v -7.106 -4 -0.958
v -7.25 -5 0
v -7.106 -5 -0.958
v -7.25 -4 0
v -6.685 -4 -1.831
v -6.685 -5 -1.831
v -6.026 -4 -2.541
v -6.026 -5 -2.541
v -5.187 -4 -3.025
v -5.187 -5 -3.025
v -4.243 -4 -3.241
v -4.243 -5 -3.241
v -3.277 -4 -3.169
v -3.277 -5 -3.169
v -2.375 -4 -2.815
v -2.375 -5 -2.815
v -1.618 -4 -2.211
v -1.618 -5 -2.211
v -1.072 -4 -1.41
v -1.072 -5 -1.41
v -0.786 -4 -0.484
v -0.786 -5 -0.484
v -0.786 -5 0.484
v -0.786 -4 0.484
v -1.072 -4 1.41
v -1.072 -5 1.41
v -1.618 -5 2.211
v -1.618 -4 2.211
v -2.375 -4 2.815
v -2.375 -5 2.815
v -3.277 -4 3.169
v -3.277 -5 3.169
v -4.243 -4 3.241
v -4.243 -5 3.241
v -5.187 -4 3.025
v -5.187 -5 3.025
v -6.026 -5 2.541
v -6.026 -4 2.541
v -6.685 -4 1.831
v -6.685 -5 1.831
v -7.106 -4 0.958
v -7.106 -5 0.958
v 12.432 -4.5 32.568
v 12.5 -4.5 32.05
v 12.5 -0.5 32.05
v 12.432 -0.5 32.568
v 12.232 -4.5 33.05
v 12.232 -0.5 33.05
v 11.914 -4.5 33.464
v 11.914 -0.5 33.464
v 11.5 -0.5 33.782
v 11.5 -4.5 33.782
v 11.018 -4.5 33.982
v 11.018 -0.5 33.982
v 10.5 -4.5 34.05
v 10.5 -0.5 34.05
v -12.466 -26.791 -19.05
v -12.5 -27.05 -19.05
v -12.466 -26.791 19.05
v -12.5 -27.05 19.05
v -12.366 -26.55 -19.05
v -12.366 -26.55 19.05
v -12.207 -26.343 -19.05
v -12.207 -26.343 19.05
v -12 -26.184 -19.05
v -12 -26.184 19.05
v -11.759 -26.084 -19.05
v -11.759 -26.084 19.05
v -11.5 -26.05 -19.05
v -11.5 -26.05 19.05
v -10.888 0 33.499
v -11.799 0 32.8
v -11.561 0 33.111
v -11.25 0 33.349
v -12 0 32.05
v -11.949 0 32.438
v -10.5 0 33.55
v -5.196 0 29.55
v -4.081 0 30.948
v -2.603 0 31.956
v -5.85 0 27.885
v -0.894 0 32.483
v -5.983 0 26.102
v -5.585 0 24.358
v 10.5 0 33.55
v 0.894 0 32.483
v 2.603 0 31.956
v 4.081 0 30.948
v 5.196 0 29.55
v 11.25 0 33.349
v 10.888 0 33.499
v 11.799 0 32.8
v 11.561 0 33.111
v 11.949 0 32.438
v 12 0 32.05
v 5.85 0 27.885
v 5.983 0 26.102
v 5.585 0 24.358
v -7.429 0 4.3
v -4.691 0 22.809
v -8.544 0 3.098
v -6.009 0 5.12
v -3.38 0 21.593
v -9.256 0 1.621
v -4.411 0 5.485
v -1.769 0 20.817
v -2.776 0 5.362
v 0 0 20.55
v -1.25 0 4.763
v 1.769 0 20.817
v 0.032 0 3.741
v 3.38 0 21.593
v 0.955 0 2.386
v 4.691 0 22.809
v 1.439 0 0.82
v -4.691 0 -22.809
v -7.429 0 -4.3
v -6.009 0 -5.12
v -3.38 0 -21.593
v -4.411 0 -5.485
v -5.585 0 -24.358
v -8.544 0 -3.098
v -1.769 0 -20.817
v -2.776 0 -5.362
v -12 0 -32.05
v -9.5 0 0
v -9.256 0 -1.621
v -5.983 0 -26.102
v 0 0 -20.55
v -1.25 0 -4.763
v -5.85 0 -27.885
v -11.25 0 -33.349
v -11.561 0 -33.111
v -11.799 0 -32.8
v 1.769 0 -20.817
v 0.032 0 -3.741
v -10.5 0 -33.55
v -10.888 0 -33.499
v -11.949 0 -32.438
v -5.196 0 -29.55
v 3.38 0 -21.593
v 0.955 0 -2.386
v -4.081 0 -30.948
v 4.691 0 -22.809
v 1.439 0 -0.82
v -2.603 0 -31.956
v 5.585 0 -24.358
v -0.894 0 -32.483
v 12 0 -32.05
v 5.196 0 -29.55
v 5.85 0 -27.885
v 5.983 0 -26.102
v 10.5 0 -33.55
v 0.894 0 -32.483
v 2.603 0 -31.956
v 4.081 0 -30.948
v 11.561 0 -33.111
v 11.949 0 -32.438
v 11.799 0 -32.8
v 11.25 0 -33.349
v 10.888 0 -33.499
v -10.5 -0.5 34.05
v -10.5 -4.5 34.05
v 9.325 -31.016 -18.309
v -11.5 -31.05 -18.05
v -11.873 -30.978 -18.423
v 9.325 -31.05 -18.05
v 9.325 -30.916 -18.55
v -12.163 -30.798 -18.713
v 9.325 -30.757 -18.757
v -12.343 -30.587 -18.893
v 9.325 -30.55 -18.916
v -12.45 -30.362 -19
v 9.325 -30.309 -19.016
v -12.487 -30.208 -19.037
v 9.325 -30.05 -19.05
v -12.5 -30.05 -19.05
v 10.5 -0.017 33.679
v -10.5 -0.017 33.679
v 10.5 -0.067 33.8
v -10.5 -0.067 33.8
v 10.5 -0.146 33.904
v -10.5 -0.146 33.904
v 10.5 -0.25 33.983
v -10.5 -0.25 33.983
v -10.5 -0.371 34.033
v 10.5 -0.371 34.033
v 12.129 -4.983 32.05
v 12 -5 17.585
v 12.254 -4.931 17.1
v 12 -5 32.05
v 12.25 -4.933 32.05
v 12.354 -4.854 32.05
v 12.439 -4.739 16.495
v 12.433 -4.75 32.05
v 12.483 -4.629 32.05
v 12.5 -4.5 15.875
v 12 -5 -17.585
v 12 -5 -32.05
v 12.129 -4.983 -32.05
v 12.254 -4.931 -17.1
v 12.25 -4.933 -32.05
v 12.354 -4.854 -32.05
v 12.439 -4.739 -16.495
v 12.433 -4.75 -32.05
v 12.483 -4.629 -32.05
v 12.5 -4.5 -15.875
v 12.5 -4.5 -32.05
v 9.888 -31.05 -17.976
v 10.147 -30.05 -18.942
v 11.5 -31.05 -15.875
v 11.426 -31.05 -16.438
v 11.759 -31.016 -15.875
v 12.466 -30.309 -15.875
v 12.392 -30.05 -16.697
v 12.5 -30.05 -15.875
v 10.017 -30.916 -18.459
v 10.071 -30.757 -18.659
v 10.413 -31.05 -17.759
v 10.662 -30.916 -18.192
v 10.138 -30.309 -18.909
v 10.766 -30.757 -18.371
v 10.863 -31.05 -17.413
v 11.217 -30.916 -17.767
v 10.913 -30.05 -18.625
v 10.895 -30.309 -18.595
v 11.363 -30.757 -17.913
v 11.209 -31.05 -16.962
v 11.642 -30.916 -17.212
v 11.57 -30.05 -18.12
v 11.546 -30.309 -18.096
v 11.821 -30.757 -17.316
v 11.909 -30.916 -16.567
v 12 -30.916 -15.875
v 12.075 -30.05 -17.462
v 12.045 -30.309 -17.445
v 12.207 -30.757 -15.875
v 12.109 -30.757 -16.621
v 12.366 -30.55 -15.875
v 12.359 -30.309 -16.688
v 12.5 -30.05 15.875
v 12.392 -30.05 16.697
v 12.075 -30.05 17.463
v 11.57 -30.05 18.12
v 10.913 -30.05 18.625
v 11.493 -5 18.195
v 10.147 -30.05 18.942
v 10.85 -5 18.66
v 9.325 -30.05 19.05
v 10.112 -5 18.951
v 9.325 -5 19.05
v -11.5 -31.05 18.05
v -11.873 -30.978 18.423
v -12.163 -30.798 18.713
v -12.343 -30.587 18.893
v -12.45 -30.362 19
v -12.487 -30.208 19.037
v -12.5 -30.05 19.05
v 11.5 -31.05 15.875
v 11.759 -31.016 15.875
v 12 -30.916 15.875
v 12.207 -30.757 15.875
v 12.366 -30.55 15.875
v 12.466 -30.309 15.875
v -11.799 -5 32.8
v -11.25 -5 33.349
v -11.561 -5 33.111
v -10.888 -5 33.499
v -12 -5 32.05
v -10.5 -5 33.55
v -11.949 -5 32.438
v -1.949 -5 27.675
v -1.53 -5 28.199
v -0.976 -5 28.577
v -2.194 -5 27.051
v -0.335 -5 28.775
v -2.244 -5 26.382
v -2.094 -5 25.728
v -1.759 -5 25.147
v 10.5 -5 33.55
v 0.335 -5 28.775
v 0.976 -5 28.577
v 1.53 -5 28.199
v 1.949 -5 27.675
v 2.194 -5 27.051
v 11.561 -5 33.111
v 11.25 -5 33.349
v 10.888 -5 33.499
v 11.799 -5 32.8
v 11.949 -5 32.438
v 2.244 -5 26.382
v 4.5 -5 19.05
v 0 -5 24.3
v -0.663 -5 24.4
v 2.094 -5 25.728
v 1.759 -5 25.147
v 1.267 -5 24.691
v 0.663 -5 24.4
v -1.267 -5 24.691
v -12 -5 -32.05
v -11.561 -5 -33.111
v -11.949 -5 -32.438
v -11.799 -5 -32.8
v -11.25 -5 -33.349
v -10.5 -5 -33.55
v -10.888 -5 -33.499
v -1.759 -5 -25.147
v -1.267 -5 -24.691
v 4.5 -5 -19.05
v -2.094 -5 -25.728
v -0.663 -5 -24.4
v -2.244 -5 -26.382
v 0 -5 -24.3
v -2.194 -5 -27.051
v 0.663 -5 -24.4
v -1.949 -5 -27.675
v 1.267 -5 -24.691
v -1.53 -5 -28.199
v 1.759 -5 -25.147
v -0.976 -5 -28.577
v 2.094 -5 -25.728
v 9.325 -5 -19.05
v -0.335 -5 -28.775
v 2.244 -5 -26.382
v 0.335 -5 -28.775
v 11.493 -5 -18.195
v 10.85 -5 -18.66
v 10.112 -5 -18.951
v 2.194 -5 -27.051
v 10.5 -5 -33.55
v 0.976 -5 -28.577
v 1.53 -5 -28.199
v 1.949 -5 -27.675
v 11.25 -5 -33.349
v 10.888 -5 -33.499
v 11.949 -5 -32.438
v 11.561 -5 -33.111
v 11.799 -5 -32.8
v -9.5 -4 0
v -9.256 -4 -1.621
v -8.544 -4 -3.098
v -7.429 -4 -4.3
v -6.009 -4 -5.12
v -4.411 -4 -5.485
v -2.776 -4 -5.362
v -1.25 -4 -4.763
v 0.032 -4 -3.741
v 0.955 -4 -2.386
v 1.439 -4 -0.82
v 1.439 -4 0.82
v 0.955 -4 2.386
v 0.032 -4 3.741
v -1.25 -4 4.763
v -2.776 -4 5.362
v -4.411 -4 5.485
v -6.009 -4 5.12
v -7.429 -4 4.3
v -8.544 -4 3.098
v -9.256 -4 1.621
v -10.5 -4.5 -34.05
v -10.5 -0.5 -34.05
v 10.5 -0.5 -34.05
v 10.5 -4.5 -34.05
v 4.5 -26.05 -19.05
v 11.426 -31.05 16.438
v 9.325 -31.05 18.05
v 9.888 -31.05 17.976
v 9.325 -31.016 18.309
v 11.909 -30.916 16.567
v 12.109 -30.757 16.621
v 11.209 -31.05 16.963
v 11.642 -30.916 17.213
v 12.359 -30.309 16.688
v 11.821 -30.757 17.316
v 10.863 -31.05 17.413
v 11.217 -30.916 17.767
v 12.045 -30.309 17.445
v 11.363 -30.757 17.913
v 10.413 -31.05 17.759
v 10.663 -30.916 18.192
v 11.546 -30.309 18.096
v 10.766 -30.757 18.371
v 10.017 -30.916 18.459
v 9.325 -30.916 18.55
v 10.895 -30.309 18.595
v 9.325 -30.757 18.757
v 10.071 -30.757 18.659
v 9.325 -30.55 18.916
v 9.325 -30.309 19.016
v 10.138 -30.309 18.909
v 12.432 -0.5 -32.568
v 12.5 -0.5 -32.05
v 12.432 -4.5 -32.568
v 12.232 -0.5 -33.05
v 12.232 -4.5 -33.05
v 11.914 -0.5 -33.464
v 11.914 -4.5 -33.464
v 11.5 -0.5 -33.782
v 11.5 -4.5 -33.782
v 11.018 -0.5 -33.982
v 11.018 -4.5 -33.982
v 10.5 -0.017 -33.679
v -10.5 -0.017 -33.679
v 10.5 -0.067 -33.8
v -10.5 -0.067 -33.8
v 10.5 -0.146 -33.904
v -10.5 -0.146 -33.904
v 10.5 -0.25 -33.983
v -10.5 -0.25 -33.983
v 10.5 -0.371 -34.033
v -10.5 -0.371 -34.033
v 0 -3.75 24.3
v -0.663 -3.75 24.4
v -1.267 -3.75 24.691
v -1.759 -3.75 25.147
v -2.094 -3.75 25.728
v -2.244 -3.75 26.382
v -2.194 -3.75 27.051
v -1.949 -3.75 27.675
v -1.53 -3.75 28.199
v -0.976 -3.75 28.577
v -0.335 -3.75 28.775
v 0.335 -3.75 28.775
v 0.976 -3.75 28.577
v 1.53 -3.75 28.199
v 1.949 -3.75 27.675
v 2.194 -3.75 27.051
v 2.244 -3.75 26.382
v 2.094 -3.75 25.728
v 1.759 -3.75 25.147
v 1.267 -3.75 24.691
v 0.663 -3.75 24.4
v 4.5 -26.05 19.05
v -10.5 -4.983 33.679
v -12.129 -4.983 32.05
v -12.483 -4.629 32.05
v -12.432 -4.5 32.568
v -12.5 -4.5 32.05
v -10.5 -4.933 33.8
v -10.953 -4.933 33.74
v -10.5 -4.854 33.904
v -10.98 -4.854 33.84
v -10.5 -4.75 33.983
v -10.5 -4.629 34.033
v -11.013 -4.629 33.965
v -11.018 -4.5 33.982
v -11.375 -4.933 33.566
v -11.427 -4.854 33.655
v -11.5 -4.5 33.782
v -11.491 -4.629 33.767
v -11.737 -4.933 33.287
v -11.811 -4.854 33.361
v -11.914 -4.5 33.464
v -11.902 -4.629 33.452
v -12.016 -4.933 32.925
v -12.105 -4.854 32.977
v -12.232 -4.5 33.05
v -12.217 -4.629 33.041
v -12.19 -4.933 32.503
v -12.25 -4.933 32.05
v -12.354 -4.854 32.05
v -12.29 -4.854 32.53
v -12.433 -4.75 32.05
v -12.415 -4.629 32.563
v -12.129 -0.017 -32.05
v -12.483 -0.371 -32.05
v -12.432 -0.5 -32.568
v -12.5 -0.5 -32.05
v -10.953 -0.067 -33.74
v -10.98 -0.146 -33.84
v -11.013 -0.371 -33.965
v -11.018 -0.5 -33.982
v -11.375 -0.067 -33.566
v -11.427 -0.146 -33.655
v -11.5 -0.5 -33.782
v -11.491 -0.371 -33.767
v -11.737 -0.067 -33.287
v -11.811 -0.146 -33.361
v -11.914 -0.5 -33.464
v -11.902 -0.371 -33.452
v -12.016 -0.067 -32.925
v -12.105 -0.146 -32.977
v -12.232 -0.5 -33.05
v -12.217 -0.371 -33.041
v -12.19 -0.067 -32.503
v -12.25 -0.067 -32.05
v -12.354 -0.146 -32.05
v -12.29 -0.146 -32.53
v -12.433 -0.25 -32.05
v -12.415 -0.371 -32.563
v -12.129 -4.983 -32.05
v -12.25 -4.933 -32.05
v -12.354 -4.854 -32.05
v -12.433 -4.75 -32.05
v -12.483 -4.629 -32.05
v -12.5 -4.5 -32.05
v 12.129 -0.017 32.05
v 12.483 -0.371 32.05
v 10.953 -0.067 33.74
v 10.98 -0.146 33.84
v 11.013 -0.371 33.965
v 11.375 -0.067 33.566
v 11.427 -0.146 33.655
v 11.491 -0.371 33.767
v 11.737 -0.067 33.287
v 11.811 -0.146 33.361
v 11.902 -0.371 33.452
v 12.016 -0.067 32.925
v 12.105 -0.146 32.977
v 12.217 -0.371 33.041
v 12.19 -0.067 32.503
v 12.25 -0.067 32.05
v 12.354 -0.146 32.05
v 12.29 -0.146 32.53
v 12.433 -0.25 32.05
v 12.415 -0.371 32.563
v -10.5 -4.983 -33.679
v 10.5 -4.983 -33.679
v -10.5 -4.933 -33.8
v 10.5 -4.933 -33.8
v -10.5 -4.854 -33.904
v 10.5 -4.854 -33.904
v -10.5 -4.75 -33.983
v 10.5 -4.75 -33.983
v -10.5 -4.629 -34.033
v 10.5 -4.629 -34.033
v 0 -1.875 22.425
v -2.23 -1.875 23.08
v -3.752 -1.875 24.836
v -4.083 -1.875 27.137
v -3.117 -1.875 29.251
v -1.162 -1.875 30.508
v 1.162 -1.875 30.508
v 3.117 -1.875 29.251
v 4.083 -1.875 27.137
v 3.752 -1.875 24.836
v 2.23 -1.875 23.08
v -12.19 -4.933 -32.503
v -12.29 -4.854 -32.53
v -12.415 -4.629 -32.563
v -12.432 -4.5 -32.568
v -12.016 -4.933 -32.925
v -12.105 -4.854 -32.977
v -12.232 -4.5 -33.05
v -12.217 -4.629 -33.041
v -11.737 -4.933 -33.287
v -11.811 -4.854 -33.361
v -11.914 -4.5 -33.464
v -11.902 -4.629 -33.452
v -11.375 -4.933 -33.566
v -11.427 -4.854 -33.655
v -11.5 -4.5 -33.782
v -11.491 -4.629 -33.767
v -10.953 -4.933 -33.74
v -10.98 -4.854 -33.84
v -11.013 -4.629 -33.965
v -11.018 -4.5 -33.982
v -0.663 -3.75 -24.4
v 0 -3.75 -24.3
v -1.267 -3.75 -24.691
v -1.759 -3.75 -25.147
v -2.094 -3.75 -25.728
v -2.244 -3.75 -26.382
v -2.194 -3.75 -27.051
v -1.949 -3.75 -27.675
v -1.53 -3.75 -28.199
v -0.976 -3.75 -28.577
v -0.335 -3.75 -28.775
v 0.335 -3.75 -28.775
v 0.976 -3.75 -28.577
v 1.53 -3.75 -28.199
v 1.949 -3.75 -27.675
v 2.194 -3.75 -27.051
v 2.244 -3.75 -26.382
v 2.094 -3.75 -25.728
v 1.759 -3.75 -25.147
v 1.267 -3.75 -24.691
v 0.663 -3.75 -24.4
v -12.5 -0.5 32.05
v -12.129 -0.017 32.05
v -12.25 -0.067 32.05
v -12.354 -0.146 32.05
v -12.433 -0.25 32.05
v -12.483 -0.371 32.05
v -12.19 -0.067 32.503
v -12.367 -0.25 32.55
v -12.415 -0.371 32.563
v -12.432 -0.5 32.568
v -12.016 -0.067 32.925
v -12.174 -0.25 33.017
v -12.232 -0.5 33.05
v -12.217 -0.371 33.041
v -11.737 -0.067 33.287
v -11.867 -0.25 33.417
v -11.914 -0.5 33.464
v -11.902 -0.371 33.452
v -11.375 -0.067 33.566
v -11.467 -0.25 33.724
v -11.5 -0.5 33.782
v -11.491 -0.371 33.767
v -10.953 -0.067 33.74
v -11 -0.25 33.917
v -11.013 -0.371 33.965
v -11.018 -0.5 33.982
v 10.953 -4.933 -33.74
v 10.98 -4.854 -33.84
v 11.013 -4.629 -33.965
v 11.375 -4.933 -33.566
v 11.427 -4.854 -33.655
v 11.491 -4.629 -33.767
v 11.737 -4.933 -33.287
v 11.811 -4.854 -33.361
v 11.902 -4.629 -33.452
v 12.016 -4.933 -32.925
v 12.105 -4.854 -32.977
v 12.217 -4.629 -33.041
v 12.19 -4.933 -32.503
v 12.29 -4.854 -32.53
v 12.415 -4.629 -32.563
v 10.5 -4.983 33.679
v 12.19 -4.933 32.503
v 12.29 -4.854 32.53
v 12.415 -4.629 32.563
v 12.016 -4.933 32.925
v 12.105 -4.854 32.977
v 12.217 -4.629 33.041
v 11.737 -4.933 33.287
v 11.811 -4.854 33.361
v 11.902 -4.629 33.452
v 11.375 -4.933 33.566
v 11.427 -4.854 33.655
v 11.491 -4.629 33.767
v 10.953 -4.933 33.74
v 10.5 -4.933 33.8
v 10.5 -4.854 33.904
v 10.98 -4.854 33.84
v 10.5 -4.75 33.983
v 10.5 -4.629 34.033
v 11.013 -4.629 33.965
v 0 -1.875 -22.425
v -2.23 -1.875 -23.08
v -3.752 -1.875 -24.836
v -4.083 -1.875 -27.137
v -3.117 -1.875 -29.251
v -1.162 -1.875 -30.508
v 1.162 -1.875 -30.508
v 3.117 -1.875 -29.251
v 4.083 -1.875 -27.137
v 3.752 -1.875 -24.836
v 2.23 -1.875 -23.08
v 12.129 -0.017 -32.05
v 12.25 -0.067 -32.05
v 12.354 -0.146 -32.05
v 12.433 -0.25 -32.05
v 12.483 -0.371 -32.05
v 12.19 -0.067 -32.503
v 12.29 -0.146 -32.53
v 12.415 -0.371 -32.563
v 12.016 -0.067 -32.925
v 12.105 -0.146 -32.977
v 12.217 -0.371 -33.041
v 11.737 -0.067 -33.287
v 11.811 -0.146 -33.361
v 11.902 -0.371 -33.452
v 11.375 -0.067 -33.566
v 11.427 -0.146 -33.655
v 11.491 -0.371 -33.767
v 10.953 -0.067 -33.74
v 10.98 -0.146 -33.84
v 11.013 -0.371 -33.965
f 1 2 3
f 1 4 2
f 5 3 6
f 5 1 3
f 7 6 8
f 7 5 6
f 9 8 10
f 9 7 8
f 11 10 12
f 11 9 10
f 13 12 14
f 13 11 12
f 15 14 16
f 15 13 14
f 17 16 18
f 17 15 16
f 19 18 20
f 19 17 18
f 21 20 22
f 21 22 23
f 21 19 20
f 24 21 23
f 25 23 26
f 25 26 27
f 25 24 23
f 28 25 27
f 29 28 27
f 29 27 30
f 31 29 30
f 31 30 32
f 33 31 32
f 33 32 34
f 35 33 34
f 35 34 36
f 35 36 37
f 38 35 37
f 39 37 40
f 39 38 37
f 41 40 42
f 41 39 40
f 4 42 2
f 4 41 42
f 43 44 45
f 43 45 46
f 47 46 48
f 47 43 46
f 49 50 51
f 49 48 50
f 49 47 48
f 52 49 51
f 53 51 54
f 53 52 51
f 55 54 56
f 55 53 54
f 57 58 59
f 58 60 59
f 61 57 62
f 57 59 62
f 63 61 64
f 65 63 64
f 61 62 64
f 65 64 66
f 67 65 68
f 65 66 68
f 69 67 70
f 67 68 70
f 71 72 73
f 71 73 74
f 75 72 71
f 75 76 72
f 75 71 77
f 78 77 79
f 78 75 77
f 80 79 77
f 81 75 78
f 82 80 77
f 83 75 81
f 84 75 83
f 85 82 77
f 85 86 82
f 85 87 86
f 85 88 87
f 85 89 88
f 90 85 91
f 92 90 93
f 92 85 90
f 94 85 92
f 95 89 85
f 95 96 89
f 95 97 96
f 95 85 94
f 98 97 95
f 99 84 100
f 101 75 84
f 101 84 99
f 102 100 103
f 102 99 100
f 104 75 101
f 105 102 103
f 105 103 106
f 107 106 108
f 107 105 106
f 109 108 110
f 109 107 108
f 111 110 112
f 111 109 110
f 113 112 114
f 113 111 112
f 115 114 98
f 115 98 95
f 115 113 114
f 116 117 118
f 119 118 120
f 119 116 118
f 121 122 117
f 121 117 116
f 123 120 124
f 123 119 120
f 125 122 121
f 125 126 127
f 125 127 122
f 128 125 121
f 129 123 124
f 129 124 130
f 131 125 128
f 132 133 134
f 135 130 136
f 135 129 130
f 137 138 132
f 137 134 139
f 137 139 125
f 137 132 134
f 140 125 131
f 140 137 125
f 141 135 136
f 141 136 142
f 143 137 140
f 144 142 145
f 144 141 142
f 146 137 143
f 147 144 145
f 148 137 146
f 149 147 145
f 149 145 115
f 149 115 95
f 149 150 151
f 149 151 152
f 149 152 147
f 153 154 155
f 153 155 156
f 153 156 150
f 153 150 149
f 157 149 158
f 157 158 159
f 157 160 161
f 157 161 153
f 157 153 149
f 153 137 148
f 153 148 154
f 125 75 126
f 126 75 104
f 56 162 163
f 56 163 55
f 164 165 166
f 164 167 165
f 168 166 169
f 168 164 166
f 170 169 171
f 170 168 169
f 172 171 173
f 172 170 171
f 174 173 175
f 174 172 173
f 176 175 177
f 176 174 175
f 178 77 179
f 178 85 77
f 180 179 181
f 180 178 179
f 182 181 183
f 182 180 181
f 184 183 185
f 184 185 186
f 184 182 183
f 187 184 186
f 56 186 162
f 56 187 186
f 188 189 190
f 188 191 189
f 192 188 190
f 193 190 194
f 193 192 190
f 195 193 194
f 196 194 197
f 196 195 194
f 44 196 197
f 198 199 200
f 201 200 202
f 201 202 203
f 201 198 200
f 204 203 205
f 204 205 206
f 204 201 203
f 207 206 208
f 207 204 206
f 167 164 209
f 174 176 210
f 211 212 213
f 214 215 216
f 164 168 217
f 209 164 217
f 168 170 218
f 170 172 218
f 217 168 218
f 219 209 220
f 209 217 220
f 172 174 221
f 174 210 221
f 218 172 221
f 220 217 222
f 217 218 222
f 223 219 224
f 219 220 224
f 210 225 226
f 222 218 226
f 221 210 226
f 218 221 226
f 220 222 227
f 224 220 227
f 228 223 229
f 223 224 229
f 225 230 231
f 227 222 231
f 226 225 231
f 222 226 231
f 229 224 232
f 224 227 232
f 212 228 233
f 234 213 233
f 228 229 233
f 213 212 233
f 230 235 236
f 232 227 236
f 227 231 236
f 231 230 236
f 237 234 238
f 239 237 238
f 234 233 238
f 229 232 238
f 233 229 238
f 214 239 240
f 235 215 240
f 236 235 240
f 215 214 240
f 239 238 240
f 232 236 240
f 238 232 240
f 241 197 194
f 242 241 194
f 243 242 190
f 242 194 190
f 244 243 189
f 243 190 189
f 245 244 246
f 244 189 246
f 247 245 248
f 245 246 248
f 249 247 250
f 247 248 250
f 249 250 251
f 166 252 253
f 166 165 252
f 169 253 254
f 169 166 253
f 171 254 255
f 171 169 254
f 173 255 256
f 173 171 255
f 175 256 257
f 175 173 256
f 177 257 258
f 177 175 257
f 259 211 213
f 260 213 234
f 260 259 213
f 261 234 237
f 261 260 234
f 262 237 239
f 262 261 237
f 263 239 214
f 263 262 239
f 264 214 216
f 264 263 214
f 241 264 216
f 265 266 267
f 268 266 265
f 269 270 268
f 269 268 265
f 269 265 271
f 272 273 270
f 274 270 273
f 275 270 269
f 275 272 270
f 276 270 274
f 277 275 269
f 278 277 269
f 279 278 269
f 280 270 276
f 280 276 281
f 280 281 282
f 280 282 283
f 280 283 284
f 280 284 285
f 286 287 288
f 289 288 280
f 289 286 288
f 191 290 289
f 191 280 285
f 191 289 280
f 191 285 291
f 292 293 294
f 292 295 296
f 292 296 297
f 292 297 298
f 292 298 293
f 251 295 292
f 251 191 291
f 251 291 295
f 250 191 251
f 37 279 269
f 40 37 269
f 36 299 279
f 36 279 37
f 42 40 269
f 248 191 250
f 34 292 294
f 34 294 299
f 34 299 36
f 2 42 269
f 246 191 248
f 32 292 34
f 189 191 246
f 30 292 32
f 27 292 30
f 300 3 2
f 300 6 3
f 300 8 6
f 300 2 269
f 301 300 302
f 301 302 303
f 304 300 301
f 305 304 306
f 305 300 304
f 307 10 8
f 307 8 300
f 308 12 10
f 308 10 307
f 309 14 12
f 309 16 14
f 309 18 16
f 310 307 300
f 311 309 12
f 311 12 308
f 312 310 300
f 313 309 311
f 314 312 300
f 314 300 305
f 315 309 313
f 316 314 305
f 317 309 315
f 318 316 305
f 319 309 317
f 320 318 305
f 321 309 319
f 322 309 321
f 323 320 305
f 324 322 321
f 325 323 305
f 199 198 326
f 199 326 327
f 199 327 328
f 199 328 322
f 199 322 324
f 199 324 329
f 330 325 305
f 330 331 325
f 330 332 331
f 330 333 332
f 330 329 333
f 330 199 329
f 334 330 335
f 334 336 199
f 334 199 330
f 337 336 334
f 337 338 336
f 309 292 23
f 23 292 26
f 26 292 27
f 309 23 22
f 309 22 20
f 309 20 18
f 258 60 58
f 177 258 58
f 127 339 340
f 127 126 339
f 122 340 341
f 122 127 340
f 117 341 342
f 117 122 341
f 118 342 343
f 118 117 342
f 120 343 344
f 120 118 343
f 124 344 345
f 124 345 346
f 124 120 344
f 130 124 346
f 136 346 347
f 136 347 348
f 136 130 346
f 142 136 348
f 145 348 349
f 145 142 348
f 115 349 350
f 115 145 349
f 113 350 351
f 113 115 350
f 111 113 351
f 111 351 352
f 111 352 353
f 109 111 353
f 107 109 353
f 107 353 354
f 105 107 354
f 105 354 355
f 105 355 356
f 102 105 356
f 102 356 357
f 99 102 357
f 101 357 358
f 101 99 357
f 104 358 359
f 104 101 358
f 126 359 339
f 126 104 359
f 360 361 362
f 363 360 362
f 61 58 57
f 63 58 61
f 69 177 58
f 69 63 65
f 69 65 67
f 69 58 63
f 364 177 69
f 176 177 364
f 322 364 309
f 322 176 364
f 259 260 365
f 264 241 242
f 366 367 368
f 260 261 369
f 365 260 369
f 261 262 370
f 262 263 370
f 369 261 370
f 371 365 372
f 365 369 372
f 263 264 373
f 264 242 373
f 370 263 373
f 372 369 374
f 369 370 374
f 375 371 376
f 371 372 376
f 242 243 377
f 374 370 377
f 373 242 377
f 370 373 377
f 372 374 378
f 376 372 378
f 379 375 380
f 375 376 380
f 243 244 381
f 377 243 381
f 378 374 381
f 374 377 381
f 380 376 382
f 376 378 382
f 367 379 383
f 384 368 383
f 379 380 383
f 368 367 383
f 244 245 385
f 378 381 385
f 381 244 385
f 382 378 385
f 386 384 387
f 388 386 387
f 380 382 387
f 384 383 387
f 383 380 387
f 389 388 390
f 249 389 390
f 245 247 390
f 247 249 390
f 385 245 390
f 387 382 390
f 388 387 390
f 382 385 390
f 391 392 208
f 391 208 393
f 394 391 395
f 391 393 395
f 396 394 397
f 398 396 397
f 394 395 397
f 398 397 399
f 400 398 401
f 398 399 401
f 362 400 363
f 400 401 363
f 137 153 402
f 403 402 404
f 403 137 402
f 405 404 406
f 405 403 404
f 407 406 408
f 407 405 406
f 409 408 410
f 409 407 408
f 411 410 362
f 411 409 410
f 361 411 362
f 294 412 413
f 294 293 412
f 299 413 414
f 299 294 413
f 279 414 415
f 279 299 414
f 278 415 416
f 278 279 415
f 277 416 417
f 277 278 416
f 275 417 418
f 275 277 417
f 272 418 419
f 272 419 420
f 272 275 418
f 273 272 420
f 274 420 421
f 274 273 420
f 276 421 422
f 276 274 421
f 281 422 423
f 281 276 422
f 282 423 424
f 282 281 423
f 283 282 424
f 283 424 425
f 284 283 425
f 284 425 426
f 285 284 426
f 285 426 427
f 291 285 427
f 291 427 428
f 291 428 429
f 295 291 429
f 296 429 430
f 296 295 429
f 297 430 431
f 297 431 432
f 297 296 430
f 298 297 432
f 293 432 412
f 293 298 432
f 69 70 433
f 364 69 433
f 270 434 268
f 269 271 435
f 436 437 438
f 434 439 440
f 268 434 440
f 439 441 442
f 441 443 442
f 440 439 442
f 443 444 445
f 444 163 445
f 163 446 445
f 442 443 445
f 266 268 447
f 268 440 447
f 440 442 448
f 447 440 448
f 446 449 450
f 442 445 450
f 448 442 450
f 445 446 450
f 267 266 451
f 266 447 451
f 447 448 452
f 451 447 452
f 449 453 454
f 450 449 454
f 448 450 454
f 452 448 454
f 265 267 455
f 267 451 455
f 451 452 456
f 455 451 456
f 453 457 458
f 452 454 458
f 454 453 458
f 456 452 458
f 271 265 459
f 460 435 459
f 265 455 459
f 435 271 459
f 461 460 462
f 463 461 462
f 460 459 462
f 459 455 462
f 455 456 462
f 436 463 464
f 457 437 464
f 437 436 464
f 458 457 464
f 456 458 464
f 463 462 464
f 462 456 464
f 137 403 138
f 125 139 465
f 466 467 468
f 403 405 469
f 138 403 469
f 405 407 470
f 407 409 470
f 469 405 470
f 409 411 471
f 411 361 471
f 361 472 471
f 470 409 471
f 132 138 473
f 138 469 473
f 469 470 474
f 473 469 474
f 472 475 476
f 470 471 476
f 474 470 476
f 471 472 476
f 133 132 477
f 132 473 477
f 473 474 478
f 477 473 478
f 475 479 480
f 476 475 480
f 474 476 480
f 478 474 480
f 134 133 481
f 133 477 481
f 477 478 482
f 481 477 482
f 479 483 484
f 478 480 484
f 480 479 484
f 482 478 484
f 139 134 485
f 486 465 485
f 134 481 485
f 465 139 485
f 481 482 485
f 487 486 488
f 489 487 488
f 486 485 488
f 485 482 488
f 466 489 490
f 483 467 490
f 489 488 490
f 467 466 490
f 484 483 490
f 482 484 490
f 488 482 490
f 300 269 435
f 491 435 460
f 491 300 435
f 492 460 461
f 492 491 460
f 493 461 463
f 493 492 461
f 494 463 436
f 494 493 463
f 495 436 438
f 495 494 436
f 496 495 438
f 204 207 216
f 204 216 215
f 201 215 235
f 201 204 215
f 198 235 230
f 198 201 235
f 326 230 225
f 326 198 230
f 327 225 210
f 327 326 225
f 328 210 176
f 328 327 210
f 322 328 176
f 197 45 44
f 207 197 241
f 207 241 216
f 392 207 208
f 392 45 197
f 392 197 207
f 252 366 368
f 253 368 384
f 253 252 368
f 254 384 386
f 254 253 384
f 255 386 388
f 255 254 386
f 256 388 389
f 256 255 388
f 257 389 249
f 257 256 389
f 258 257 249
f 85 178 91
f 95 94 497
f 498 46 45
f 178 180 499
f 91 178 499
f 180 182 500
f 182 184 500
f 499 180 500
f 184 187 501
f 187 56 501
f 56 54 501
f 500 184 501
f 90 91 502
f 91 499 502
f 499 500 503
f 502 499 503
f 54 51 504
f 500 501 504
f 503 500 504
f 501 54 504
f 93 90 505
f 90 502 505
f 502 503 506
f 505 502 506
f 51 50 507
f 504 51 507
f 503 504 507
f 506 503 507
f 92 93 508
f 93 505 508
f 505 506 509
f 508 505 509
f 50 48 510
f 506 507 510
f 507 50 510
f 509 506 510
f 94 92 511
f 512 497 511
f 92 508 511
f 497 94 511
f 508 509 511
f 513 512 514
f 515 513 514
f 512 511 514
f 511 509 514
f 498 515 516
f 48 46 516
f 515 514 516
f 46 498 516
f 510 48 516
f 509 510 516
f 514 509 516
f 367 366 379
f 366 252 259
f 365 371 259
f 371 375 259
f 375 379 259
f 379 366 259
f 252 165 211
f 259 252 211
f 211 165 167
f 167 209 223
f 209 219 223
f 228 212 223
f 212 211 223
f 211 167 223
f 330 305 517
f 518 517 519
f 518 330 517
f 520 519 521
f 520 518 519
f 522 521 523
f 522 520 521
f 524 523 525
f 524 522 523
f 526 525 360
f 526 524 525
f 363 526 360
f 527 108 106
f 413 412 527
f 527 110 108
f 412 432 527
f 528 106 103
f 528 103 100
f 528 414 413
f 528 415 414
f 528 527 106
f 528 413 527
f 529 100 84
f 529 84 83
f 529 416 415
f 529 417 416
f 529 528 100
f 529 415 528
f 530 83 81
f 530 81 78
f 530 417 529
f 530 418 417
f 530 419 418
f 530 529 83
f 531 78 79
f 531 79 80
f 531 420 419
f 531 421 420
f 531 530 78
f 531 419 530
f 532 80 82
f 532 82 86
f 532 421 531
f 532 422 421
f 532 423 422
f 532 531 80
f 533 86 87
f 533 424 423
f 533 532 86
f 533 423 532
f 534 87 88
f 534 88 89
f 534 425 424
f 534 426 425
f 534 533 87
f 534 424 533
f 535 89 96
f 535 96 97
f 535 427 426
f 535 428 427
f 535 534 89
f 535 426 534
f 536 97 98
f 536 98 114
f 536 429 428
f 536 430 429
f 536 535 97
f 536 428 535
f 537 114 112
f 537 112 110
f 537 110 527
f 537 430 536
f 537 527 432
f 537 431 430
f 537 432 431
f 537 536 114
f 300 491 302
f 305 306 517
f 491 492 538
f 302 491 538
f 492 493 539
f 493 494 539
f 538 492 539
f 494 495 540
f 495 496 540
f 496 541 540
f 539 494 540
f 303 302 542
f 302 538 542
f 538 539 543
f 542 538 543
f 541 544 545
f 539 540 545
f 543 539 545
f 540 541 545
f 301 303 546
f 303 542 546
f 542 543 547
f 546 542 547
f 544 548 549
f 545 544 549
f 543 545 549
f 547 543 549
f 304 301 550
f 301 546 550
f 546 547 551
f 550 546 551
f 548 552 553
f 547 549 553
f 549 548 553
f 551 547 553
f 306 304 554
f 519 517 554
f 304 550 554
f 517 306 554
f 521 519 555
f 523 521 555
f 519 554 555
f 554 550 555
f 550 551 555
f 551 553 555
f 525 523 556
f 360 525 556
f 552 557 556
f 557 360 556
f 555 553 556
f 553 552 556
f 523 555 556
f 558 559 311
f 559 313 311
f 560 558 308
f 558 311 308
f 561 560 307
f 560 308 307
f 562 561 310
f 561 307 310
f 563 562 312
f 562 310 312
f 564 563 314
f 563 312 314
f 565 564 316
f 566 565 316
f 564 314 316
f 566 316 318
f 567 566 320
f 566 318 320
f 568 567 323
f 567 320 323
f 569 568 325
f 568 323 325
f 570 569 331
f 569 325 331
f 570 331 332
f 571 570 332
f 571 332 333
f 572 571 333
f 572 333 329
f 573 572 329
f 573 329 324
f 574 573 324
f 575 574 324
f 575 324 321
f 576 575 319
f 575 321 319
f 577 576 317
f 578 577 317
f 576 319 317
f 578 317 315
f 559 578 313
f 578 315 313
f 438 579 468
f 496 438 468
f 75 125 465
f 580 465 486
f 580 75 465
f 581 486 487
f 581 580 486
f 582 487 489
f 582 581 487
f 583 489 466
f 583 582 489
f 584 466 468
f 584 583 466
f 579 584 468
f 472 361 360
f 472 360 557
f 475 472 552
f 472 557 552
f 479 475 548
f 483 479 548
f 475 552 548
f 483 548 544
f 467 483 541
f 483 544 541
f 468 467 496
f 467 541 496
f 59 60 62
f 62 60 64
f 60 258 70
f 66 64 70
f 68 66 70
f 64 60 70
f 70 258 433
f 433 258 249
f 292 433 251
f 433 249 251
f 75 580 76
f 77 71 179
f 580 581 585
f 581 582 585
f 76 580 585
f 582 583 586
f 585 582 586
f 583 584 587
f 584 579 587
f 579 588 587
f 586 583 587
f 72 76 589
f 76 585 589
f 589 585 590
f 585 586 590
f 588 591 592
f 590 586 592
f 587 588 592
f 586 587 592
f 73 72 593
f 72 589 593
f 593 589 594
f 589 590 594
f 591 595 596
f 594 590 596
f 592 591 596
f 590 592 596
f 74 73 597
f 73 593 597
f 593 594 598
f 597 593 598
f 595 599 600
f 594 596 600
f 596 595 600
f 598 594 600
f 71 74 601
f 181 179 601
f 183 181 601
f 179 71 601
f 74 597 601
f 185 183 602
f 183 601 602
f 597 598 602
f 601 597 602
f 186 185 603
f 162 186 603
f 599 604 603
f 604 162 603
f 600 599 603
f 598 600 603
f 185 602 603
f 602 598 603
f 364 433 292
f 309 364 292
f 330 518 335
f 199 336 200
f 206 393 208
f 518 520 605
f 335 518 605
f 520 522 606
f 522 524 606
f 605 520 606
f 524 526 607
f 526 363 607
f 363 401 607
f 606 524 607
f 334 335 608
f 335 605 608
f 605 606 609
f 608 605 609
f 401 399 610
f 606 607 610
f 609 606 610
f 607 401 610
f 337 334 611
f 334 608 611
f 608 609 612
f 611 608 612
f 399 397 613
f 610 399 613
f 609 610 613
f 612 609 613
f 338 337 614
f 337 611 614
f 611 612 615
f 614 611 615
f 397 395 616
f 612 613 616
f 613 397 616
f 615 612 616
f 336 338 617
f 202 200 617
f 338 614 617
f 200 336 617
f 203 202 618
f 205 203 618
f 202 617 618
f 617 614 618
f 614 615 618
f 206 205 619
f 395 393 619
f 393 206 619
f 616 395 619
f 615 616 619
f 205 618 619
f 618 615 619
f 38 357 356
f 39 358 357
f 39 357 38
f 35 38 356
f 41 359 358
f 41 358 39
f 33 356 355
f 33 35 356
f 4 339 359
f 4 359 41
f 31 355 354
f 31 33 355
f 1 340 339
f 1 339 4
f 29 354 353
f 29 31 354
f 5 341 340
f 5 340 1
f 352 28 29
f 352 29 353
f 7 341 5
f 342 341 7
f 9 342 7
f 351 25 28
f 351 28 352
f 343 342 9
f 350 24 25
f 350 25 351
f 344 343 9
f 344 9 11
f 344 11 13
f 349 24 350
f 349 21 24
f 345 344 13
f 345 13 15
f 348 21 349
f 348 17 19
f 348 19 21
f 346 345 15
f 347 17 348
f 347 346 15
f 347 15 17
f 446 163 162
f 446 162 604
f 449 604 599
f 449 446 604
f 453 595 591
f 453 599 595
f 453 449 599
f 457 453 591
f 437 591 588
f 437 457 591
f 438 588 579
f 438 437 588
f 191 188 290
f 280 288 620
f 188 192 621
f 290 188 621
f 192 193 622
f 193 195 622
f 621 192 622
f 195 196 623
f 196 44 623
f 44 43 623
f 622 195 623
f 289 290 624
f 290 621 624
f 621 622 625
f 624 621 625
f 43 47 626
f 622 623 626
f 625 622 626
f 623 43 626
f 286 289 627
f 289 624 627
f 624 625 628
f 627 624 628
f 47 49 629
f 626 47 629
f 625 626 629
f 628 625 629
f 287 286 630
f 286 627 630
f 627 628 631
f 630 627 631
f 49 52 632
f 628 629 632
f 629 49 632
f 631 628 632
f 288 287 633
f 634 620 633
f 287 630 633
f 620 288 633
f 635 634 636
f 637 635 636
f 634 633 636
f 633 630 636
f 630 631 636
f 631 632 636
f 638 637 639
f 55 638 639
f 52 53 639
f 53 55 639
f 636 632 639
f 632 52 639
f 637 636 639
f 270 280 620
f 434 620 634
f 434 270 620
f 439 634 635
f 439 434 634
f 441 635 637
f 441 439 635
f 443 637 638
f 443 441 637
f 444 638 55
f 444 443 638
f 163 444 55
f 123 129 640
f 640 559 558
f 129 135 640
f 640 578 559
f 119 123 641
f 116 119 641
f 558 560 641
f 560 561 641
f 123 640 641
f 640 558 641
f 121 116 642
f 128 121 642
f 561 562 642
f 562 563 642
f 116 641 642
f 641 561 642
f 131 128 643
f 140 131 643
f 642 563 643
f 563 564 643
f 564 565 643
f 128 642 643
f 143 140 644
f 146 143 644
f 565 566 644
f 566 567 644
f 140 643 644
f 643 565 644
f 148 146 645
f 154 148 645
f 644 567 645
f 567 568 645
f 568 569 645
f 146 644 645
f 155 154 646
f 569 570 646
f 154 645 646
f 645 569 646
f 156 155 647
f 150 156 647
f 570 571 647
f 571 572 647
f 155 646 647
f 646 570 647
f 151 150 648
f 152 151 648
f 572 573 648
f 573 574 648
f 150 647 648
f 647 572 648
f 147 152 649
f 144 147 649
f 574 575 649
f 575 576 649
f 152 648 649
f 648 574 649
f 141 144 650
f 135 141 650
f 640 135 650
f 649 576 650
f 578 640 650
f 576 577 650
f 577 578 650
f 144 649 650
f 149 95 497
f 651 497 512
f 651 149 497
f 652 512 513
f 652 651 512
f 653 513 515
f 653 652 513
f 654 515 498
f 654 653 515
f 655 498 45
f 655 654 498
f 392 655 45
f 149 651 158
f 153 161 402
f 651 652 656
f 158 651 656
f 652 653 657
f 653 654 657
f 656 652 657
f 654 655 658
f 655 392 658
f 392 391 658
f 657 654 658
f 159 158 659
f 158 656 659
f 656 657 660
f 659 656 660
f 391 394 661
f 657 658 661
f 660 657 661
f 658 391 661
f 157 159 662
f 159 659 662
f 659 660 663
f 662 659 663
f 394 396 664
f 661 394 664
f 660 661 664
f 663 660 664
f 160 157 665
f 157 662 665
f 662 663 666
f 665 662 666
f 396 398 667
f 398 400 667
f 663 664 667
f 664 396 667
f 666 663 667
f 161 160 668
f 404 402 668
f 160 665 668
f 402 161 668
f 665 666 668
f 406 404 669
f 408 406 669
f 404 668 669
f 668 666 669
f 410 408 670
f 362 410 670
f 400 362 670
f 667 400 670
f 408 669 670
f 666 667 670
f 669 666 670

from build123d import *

# Parameters (mm, degrees)
SKETCH1_W           = 25
SKETCH1_H           = 68.1
BOSS_EXTRUDE1_DEPTH = 31.05
CUT_EXTRUDE1_REACH  = 54.426
SKETCH2_W           = 15
SKETCH2_H           = 26.05
SKETCH3_W           = 17
SKETCH3_H           = 21.05
CUT_EXTRUDE2_DEPTH  = 25
FILLET5_R           = 3.175
FILLET2_R           = 1
FILLET6_R           = 2
FILLET3_R           = 0.5


with BuildPart() as part:
    # Sketch1 → Boss-Extrude1 (new body)
    with BuildSketch(Plane(origin=(0, 0, 0), x_dir=(1, 0, 0), z_dir=(0, 1, 0))):
        Rectangle(SKETCH1_W, SKETCH1_H)
    extrude(amount=-BOSS_EXTRUDE1_DEPTH)

    # Sketch2 → Cut-Extrude1 (cut, up to next)
    with BuildSketch(Plane(origin=(12.5, 0, 0), x_dir=(0, 0, -1), z_dir=(1, 0, 0)), mode=Mode.PRIVATE) as cut_extrude1_sk1:
        with Locations((-26.55, -18.025)):
            Rectangle(SKETCH2_W, SKETCH2_H)
    cut_extrude1_tool1 = extrude(cut_extrude1_sk1.sketch, amount=-CUT_EXTRUDE1_REACH, mode=Mode.PRIVATE) & part.part
    # Sketch2 → Cut-Extrude1 (cut, up to next)
    with BuildSketch(Plane(origin=(12.5, 0, 0), x_dir=(0, 0, -1), z_dir=(1, 0, 0)), mode=Mode.PRIVATE) as cut_extrude1_sk2:
        with Locations((26.55, -18.025)):
            Rectangle(SKETCH2_W, SKETCH2_H)
    cut_extrude1_tool2 = extrude(cut_extrude1_sk2.sketch, amount=-CUT_EXTRUDE1_REACH, mode=Mode.PRIVATE) & part.part
    add(cut_extrude1_tool1.solids().sort_by_distance((12.5, -18.025, 26.55))[0], mode=Mode.SUBTRACT)
    add(cut_extrude1_tool2.solids().sort_by_distance((12.5, -18.025, -26.55))[0], mode=Mode.SUBTRACT)

    # Sketch3 → Cut-Extrude2 (cut, symmetric)
    with BuildSketch(Plane.XY):
        with Locations((-4, -15.525)):
            Rectangle(SKETCH3_W, SKETCH3_H)
    extrude(amount=CUT_EXTRUDE2_DEPTH, both=True, mode=Mode.SUBTRACT)

    # Sketch5 → Cut-Revolve1 (revolve, cut)
    with BuildSketch(Plane(origin=(0, 0, 0), x_dir=(0, 0, -1), z_dir=(1, 0, 0)), mode=Mode.PRIVATE) as cut_revolve1_sk:
        Polygon((-32.55, 0), (-28.8, -3.75), (-28.8, -5), (-26.55, -5), (-26.55, 0), align=None)
    cut_revolve1 = revolve(cut_revolve1_sk.sketch.rotate(Axis((0, -5, 26.55), (0, 1, 0)), 180), axis=Axis((0, -5, 26.55), (0, 1, 0)), mode=Mode.SUBTRACT)

    # Mirror1: Cut-Revolve1 across plane
    add(cut_revolve1.mirror(Plane.XY), mode=Mode.SUBTRACT)

    # Sketch6 → Cut-Revolve2 (revolve, cut)
    with BuildSketch(Plane.XY, mode=Mode.PRIVATE) as cut_revolve2_sk:
        Polygon((-4, 0), (-4, -5), (-0.75, -5), (-0.75, -4), (1.5, -4), (1.5, 0), align=None)
    revolve(cut_revolve2_sk.sketch.rotate(Axis((-4, 0, 0), (0, -1, 0)), 180), axis=Axis((-4, 0, 0), (0, -1, 0)), mode=Mode.SUBTRACT)

    # Fillet5
    fillet5_edges = [part.edges().sort_by_distance(p)[0] for p in [
        (12.5, -18.025, 19.05),
        (12.5, -18.025, -19.05),
    ]]
    fillet(fillet5_edges, radius=FILLET5_R)

    # Fillet2
    fillet2_edges = [part.edges().sort_by_distance(p)[0] for p in [
        (-12.5, -31.05, 0),
        (-1.5875, -31.05, 19.05),
        (-1.5875, -31.05, -19.05),
        (-12.5, -26.05, 0),
        (12.5, -31.05, 0),
        (11.57006403, -31.05, -18.12006403),
        (11.57006403, -31.05, 18.12006403),
    ]]
    fillet(fillet2_edges, radius=FILLET2_R)

    # Fillet6
    fillet6_edges = [part.edges().sort_by_distance(p)[0] for p in [
        (12.5, -2.5, -34.05),
        (-12.5, -2.5, -34.05),
        (-12.5, -2.5, 34.05),
        (12.5, -2.5, 34.05),
    ]]
    fillet(fillet6_edges, radius=FILLET6_R)

    # Fillet3
    fillet3_edges = [part.edges().sort_by_distance(p)[0] for p in [
        (0, -5, 34.05),
        (0, 0, 34.05),
        (12.5, 0, 0),
        (0, 0, -34.05),
        (-12.5, 0, 0),
        (-11.914213562, 0, -33.464213562),
        (11.914213562, 0, -33.464213562),
        (-11.914213562, 0, 33.464213562),
        (11.914213562, 0, 33.464213562),
        (12.5, -5, -23.9625),
        (-12.5, -5, 0),
        (0, -5, -34.05),
        (-11.914213562, -5, -33.464213562),
        (11.914213562, -5, -33.464213562),
        (-11.914213562, -5, 33.464213562),
        (11.914213562, -5, 33.464213562),
        (12.5, -5, 23.9625),
    ]]
    fillet(fillet3_edges, radius=FILLET3_R)


solid = part.part
